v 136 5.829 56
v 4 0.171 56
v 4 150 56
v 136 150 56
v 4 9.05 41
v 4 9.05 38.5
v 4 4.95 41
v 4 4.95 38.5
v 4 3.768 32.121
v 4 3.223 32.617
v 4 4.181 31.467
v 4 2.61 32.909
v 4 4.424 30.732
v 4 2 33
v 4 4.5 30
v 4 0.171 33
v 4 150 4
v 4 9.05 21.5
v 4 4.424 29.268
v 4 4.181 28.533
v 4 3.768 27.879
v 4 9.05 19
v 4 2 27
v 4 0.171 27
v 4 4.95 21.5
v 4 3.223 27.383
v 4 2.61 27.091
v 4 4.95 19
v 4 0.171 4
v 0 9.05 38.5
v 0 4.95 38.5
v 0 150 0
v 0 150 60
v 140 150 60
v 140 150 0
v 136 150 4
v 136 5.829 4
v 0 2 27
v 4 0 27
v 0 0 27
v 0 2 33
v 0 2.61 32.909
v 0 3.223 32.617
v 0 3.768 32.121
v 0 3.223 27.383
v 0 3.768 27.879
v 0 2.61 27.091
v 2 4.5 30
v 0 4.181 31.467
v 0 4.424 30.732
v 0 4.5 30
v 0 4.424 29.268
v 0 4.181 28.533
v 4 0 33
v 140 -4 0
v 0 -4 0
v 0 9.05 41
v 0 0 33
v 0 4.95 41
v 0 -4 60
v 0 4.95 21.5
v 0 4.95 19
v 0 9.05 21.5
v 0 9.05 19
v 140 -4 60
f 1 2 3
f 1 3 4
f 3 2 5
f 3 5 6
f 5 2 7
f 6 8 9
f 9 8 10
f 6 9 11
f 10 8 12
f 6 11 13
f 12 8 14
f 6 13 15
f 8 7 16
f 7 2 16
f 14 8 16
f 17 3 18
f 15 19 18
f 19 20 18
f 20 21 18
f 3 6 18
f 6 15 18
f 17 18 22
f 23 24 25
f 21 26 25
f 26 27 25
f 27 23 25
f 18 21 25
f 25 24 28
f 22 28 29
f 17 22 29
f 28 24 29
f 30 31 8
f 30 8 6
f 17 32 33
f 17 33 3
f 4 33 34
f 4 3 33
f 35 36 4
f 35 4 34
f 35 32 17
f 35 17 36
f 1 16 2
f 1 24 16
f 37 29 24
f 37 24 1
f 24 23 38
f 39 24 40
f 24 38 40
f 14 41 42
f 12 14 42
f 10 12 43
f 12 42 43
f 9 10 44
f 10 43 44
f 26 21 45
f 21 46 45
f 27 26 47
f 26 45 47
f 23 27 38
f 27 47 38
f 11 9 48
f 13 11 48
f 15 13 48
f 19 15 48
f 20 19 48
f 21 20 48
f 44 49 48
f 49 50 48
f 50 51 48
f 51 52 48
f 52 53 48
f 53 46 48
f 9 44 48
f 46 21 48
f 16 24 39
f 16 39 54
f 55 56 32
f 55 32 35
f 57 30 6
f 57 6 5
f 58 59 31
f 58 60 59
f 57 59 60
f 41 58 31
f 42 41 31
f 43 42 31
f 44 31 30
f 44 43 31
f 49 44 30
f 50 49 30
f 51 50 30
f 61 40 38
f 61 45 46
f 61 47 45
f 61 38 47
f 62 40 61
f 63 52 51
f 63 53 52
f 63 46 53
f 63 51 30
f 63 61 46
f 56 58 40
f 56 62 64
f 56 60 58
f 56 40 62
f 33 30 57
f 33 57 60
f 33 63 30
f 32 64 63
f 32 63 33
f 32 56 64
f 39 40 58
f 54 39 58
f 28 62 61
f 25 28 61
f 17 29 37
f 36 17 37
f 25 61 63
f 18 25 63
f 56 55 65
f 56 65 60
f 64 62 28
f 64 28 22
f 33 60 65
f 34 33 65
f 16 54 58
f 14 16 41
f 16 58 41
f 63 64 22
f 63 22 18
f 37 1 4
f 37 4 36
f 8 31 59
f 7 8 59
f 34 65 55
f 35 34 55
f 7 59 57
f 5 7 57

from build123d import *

# Parameters (mm, degrees)
SKETCH1_W           = 140
SKETCH1_H           = 60
SKETCH1_W_2         = 132
SKETCH1_H_2         = 52
BOSS_EXTRUDE1_DEPTH = 150
BOSS_EXTRUDE3_DEPTH = 60
CUT_EXTRUDE1_DEPTH  = 4
SKETCH5_W           = 2.5
SKETCH5_H           = 4.1
CUT_EXTRUDE2_DEPTH  = 4


with BuildPart() as part:
    # Sketch1 → Boss-Extrude1 (new body)
    with BuildSketch(Plane(origin=(0, 0, 0), x_dir=(1, 0, 0), z_dir=(0, 1, 0))):
        with Locations((70, -30)):
            Rectangle(SKETCH1_W, SKETCH1_H)
        with Locations((70, -30)):
            Rectangle(SKETCH1_W_2, SKETCH1_H_2, mode=Mode.SUBTRACT)
    extrude(amount=BOSS_EXTRUDE1_DEPTH)

    # Sketch3 → Boss-Extrude3 (add)
    with BuildSketch(Plane.XY):
        Polygon((0, 0), (140, 6), (140, -4), (0, -4), align=None)
    extrude(amount=BOSS_EXTRUDE3_DEPTH)

    # Sketch4 → Cut-Extrude1 (cut)
    with BuildSketch(Plane.ZY):
        with BuildLine():
            Line((27, 0), (33, 0))
            Line((33, 0), (33, 2))
            add(Edge.make_bspline(
                [(33, 2), (33, 4.5), (30, 4.5), (27, 4.5), (27, 2)],
                knots=[3.141592654, 3.141592654, 3.141592654, 4.71238898, 4.71238898, 6.283185307, 6.283185307, 6.283185307], degree=2, weights=[1, 0.707106781, 1, 0.707106781, 1]))
            Line((27, 2), (27, 0))
        make_face()
    extrude(amount=-CUT_EXTRUDE1_DEPTH, mode=Mode.SUBTRACT)

    # Sketch5 → Cut-Extrude2 (cut)
    with BuildSketch(Plane.ZY):
        with Locations((39.75, 7)):
            Rectangle(SKETCH5_W, SKETCH5_H)
        with Locations((20.25, 7)):
            Rectangle(SKETCH5_W, SKETCH5_H)
    extrude(amount=-CUT_EXTRUDE2_DEPTH, mode=Mode.SUBTRACT)


solid = part.part
